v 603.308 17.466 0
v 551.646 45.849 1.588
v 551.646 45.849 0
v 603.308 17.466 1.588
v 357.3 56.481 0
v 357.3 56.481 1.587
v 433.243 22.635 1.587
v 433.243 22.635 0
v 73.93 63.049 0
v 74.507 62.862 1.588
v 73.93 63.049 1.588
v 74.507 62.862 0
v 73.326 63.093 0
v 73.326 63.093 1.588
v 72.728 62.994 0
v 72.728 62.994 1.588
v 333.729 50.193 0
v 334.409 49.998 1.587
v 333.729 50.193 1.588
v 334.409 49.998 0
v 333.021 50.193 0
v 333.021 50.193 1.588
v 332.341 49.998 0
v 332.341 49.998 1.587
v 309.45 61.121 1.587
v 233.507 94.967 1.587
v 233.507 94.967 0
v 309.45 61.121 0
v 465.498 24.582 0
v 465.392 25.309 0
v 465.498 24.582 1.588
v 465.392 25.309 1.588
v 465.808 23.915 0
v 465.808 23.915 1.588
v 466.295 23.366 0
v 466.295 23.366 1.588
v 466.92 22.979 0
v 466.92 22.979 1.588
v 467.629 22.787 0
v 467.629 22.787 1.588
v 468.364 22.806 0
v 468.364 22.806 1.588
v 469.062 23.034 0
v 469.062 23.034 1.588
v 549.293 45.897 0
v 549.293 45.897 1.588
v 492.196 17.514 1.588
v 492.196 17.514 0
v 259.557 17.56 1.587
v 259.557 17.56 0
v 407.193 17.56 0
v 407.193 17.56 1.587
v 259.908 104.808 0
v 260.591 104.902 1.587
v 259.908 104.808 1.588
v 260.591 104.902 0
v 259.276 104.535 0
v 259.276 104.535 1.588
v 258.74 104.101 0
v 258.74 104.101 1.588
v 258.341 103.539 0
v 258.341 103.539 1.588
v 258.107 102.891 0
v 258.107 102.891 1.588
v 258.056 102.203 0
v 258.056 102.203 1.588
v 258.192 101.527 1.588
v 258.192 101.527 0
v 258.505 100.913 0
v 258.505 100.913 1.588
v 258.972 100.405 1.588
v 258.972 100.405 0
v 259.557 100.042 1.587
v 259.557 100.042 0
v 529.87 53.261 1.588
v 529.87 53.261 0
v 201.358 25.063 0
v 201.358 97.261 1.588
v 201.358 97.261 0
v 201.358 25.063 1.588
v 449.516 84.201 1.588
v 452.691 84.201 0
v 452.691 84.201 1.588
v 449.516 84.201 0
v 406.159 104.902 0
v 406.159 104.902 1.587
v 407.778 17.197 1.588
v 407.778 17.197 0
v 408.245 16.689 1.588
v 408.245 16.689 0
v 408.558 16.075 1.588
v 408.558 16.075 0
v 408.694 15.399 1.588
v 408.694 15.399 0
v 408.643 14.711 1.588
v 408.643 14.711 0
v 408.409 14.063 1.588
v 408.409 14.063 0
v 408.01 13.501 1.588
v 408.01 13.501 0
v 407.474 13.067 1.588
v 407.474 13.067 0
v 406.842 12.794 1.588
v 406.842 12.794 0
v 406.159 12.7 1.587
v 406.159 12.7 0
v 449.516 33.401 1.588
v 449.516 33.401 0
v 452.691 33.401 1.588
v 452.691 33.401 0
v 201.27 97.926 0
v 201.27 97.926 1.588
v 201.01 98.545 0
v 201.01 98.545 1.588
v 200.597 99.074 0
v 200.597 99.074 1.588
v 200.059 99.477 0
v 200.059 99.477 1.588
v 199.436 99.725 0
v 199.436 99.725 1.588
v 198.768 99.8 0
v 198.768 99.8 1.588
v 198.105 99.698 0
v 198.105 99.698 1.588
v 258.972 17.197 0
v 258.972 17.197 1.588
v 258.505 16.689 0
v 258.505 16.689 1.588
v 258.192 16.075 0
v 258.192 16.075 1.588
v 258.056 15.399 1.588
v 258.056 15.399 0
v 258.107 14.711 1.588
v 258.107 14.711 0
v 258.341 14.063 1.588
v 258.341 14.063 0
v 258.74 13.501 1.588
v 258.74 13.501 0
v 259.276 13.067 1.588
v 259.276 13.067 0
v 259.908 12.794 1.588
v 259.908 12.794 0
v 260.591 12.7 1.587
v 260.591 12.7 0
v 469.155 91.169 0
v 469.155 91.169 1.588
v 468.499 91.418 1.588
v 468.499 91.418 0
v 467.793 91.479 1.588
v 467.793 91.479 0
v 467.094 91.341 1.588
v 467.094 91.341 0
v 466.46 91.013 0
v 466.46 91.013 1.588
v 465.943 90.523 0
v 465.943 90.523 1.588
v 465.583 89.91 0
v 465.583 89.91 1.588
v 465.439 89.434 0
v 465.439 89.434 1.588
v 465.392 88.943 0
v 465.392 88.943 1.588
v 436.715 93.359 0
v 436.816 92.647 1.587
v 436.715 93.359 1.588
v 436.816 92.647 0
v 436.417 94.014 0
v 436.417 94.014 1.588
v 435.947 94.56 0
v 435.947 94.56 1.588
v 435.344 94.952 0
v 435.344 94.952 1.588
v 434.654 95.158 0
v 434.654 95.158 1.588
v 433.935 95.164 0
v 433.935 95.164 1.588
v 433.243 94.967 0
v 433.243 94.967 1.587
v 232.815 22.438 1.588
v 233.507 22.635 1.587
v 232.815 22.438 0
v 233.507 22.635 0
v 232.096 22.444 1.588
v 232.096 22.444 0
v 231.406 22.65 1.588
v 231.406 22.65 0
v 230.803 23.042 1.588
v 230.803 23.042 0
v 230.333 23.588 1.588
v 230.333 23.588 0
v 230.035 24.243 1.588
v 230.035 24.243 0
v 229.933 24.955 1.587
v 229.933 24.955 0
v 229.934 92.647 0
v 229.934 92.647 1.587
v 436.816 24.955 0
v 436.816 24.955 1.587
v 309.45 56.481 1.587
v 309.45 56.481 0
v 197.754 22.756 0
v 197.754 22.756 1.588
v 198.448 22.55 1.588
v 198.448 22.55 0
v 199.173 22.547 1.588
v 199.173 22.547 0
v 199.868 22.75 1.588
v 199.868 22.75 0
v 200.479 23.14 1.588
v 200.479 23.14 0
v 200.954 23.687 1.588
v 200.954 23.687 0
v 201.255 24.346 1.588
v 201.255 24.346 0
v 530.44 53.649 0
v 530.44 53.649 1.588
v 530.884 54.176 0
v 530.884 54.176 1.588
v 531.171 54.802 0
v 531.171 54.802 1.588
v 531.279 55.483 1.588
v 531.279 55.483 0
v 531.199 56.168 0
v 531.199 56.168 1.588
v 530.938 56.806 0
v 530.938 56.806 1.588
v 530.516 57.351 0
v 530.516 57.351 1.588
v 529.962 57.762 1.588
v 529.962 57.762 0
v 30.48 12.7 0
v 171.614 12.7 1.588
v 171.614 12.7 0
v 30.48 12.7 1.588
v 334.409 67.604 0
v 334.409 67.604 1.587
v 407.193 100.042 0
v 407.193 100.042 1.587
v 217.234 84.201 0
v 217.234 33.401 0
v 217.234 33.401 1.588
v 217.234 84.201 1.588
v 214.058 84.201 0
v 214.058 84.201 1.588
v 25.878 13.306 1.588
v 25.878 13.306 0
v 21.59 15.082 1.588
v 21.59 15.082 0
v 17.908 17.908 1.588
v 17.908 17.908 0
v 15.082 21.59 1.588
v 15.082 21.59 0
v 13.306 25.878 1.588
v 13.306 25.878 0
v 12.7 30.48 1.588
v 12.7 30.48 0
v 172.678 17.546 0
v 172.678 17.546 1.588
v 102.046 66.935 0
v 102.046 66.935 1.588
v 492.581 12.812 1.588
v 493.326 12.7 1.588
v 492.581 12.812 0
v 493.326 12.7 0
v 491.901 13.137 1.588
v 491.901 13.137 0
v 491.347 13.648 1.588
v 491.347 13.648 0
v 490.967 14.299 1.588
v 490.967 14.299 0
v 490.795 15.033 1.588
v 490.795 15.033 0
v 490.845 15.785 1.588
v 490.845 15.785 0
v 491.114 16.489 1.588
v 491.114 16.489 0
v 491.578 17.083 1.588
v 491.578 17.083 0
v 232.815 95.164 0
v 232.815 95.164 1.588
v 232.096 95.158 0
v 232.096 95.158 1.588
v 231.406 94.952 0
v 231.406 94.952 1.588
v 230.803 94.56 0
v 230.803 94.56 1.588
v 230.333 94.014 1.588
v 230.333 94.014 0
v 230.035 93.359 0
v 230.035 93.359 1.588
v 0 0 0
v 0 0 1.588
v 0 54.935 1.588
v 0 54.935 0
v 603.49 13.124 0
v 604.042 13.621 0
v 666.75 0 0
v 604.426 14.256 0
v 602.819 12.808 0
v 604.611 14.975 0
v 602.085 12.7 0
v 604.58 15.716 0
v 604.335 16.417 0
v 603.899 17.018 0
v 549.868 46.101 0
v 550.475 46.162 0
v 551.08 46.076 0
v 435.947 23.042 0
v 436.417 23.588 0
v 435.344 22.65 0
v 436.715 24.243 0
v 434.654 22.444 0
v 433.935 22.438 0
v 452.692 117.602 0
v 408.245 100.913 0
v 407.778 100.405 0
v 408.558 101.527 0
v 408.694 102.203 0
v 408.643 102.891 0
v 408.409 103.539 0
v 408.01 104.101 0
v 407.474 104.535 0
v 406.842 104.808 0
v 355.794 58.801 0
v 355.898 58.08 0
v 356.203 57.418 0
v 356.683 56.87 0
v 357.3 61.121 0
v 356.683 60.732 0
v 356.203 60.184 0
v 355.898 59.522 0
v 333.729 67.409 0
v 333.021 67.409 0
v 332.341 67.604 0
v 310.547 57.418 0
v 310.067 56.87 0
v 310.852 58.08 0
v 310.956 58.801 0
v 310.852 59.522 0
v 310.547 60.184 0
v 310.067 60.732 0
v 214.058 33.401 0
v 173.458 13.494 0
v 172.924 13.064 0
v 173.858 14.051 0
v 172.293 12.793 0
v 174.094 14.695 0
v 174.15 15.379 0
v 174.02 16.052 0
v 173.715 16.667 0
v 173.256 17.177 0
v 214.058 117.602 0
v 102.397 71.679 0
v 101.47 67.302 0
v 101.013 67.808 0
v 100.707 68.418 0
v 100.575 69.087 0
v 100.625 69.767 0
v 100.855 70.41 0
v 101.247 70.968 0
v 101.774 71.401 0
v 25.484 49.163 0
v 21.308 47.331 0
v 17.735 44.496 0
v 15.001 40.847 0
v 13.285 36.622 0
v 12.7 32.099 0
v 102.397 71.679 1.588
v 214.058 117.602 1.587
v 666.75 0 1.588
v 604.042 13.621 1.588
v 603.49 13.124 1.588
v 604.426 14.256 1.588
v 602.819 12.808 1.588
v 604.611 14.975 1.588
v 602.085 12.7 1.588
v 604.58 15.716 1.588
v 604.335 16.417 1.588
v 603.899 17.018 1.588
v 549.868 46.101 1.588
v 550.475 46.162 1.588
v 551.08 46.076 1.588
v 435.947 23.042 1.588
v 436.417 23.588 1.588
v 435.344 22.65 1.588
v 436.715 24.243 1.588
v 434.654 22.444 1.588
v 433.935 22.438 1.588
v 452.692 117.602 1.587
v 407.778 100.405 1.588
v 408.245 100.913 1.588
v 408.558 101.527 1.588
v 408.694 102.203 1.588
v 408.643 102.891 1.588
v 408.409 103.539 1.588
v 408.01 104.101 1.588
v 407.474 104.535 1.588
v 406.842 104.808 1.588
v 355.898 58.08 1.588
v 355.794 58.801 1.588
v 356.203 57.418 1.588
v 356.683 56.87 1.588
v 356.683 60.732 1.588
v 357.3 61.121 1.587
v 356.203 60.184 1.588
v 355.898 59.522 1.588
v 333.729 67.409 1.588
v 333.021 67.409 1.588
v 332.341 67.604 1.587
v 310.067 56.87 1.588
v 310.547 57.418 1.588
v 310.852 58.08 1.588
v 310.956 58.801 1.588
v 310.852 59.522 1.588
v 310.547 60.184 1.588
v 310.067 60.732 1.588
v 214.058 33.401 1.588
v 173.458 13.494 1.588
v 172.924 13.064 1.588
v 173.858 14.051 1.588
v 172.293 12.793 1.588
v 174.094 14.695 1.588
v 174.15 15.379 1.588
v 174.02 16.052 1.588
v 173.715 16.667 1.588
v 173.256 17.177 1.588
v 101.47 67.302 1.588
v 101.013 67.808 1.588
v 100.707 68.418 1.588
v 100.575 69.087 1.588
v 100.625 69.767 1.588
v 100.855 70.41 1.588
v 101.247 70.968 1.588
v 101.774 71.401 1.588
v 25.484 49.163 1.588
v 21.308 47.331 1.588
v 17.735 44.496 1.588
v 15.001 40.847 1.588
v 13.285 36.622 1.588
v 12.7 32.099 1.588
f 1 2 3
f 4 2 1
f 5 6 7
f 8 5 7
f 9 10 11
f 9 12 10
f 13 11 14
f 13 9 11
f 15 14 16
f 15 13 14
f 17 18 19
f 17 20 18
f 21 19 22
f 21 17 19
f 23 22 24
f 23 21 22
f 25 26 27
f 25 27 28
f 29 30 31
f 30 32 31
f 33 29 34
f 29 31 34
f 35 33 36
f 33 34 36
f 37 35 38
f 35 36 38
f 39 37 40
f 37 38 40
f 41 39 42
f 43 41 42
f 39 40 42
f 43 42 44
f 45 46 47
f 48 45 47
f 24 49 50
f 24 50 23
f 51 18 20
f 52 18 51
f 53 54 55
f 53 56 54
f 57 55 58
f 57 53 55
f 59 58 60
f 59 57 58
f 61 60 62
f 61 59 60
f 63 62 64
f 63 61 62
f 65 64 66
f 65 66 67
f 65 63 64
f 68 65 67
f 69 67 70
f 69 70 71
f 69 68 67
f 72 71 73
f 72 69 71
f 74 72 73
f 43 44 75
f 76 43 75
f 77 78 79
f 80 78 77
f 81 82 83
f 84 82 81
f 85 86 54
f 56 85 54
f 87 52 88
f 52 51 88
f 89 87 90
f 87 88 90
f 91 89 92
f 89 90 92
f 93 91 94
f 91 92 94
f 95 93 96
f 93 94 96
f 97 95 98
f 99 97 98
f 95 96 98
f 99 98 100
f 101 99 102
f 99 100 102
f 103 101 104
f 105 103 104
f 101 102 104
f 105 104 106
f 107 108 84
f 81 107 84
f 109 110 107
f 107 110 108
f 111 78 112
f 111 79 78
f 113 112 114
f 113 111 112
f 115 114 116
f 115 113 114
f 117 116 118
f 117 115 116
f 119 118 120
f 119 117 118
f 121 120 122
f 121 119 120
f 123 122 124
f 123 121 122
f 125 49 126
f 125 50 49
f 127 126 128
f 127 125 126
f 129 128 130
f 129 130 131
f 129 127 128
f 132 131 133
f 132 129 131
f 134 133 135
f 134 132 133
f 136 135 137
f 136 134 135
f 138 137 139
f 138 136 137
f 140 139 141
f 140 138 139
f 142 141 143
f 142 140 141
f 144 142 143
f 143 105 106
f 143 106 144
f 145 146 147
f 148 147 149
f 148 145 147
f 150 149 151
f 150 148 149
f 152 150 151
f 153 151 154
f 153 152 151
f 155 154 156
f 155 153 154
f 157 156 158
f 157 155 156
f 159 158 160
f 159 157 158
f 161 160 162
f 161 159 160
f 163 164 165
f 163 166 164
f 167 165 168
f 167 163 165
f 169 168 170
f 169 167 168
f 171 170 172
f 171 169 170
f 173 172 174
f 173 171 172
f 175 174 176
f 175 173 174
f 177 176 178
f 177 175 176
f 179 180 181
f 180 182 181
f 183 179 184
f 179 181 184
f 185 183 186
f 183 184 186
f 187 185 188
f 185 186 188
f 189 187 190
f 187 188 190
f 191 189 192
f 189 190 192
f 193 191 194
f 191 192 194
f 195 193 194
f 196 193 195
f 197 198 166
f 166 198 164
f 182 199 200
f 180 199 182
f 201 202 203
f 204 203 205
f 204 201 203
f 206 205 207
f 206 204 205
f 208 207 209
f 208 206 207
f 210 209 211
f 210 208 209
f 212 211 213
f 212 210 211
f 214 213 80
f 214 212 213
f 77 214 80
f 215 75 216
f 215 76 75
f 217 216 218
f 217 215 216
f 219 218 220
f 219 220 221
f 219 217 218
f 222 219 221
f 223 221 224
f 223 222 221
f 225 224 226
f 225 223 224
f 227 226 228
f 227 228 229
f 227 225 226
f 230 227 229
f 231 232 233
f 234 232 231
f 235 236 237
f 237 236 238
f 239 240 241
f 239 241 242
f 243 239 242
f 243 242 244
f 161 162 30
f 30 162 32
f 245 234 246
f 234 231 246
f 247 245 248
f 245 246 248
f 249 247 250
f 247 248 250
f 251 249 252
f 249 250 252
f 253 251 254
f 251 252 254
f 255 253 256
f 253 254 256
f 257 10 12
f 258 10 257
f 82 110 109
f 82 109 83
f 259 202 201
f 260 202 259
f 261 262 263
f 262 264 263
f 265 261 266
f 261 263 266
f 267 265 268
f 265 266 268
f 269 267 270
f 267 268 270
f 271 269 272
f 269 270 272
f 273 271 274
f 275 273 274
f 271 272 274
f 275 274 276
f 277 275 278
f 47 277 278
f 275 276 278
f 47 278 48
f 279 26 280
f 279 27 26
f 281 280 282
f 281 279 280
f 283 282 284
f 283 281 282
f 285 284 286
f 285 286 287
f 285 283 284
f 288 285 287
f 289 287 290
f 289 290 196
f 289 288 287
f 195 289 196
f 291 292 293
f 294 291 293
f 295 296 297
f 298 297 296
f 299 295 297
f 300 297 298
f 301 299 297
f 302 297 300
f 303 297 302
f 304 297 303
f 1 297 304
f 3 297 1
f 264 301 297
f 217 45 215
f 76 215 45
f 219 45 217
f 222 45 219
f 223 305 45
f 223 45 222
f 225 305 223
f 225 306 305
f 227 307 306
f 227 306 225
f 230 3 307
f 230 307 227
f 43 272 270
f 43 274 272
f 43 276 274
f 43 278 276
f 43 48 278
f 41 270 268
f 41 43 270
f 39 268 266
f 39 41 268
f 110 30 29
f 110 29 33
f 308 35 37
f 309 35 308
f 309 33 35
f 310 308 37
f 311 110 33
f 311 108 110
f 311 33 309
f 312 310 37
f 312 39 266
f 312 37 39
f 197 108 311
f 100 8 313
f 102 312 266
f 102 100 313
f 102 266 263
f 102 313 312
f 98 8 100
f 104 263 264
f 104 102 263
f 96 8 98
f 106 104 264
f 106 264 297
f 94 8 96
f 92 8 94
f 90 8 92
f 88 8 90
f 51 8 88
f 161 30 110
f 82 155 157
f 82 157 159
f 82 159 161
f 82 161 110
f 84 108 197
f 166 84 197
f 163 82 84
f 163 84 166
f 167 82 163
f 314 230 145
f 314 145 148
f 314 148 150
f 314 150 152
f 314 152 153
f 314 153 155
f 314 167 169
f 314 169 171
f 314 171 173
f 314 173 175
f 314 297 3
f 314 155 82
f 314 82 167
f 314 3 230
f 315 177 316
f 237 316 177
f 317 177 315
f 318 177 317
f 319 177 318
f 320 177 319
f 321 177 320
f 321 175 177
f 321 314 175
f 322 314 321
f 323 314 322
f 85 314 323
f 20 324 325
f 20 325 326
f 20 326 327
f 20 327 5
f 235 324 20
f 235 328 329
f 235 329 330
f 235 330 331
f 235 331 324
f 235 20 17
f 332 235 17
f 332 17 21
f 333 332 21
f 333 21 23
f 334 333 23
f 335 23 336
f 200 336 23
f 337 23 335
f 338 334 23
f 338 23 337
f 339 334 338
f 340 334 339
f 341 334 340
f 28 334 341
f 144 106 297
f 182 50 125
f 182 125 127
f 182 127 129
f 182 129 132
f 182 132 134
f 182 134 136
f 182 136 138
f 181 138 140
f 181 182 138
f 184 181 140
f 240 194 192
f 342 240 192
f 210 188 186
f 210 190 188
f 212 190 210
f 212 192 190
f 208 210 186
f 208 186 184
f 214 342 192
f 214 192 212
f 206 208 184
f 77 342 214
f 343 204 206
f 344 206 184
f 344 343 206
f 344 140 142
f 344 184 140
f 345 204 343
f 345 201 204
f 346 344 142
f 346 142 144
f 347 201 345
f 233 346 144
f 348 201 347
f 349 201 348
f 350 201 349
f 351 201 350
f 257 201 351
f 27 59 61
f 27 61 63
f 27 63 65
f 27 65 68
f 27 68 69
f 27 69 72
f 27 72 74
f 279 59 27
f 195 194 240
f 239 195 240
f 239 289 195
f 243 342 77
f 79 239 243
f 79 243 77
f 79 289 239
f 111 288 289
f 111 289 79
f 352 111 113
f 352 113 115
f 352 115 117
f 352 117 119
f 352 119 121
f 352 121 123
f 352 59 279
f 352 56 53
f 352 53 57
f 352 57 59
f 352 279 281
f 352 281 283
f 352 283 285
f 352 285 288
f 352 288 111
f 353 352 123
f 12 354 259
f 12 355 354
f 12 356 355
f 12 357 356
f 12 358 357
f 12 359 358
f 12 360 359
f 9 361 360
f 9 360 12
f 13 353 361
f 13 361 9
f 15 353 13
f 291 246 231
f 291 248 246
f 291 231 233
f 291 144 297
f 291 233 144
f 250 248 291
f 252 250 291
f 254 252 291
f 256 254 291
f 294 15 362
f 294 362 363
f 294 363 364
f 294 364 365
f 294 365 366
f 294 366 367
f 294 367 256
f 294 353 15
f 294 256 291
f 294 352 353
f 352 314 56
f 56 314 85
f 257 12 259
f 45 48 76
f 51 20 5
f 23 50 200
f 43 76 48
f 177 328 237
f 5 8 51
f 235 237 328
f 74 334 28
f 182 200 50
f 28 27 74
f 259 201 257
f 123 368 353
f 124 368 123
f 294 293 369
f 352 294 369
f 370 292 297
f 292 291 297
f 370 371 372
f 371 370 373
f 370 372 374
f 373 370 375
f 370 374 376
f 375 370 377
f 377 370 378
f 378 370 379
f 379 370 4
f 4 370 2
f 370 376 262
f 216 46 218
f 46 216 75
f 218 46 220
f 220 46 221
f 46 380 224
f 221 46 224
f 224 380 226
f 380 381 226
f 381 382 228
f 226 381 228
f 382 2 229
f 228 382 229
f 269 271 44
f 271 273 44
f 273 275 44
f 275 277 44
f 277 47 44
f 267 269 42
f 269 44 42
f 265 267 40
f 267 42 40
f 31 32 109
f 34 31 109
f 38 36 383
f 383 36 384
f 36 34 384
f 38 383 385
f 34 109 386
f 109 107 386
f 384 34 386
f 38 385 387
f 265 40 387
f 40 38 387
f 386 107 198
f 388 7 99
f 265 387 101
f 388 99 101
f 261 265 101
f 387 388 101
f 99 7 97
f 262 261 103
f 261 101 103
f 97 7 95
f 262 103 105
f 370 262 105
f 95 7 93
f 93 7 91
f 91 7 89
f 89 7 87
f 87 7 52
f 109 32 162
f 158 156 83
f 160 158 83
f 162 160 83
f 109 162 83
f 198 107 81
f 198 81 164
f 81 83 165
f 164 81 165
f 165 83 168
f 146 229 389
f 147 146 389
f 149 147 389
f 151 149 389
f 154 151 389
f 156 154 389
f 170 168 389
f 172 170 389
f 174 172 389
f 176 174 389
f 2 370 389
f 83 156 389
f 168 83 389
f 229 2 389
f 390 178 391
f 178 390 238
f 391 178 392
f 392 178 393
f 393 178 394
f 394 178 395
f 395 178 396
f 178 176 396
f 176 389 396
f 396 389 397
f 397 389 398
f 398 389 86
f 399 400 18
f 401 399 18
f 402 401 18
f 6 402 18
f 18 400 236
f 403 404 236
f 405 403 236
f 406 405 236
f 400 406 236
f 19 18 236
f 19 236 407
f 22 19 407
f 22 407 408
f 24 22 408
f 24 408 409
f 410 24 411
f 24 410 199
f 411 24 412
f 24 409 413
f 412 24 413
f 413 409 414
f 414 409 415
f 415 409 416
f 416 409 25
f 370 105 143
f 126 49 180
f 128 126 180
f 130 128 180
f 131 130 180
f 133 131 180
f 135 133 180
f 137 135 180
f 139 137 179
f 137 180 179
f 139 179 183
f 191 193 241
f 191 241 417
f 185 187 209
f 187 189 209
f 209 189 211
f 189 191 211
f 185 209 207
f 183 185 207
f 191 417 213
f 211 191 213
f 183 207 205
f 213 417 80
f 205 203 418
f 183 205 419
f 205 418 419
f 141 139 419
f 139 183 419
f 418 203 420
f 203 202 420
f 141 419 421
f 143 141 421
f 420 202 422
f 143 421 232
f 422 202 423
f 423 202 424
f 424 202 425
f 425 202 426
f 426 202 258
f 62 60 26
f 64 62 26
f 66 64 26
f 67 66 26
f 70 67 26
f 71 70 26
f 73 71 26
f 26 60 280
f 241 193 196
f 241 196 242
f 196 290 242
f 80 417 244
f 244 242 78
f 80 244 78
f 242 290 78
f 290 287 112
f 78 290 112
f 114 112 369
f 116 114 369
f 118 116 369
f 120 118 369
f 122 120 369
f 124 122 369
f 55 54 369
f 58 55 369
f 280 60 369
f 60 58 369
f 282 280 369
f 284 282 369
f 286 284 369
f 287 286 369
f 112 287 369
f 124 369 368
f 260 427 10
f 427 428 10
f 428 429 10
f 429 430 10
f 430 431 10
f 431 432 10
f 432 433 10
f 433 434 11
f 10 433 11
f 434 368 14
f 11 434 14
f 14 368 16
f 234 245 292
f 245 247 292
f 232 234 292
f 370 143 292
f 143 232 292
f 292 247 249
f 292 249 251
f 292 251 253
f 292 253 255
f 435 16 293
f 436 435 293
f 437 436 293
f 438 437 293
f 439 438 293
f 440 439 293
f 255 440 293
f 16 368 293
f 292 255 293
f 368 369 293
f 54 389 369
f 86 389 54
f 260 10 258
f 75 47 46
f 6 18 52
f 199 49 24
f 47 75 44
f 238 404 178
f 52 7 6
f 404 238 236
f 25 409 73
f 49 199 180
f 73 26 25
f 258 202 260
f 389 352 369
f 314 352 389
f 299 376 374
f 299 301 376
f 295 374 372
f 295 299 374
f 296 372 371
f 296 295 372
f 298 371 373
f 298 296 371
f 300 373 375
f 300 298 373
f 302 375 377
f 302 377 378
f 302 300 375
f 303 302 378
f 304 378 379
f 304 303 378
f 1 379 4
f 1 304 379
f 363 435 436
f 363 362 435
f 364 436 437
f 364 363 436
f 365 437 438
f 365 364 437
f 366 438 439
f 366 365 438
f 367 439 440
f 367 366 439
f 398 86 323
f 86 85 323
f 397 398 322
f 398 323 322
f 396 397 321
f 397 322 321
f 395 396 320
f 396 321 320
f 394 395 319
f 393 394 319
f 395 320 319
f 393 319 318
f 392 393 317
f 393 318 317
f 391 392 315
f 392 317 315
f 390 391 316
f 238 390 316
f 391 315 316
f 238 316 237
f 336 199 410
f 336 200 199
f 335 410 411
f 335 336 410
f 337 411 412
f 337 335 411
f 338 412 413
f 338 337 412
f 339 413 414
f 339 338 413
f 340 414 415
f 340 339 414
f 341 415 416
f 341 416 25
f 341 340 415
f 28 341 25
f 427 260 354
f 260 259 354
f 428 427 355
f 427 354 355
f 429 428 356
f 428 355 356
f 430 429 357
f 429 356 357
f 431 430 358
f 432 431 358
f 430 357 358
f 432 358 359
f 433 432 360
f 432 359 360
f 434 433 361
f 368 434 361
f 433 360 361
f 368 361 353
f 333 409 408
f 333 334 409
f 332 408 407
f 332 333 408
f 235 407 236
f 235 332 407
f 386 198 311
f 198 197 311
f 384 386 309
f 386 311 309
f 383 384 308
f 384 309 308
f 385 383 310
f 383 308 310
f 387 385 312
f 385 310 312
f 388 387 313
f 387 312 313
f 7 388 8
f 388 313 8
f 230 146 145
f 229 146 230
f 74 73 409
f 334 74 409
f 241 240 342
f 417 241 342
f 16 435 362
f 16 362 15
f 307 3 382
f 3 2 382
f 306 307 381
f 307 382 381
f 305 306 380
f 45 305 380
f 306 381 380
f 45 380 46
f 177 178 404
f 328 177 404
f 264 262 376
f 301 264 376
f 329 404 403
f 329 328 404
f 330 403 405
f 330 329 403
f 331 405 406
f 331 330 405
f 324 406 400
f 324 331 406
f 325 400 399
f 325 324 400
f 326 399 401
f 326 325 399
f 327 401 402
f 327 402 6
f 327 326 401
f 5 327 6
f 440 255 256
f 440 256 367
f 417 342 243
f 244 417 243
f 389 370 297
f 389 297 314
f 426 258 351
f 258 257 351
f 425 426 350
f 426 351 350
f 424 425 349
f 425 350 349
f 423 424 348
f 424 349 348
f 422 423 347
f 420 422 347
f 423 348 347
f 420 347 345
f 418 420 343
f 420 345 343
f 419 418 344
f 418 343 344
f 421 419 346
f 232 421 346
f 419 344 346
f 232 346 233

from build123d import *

# Parameters (mm, degrees)
SKETCH1_W               = 666.75
SKETCH1_H               = 117.602
BOSS_EXTRUDE1_DEPTH     = 1.5875
CUT_EXTRUDE1_REACH      = 679.044
SKETCH3_W               = 3.175
SKETCH3_H               = 50.8
CUT_EXTRUDE2_DEPTH      = 678.043804388
FILLET1_R               = 2.54
FILLET1_OF_MIRROR1_R    = 2.54
CUT_EXTRUDE3_DEPTH      = 678.043804388
CUT_EXTRUDE3_DEPTH_BACK = 678.043804388
FILLET2_R               = 2.54
CUT_EXTRUDE4_REACH      = 679.044
BOSS_EXTRUDE7_DEPTH     = 1.5875
CUT_EXTRUDE5_REACH      = 679.044
FILLET3_R               = 2.54
BOSS_EXTRUDE9_DEPTH     = 1.5875
CUT_EXTRUDE10_REACH     = 679.044
FILLET4_R               = 2.54
FILLET5_R               = 17.78


with BuildPart() as part:
    # Sketch1 → Boss-Extrude1 (new body)
    with BuildSketch(Plane.XY):
        with Locations((333.375, 58.801)):
            Rectangle(SKETCH1_W, SKETCH1_H)
    extrude(amount=BOSS_EXTRUDE1_DEPTH)

    # Sketch3 → Cut-Extrude1 (cut, up to next)
    with BuildSketch(Plane(origin=(0, 0, 0), x_dir=(-1, 0, 0), z_dir=(0, 0, -1)), mode=Mode.PRIVATE) as cut_extrude1_sk1:
        with Locations((-215.646, 58.801)):
            Rectangle(SKETCH3_W, SKETCH3_H)
    cut_extrude1_tool1 = extrude(cut_extrude1_sk1.sketch, amount=-CUT_EXTRUDE1_REACH, mode=Mode.PRIVATE) & part.part
    # Sketch3 → Cut-Extrude1 (cut, up to next)
    with BuildSketch(Plane(origin=(0, 0, 0), x_dir=(-1, 0, 0), z_dir=(0, 0, -1)), mode=Mode.PRIVATE) as cut_extrude1_sk2:
        with Locations((-451.104, 58.801)):
            Rectangle(SKETCH3_W, SKETCH3_H)
    cut_extrude1_tool2 = extrude(cut_extrude1_sk2.sketch, amount=-CUT_EXTRUDE1_REACH, mode=Mode.PRIVATE) & part.part
    # Sketch3 → Cut-Extrude1 (cut, up to next)
    with BuildSketch(Plane(origin=(0, 0, 0), x_dir=(-1, 0, 0), z_dir=(0, 0, -1)), mode=Mode.PRIVATE) as cut_extrude1_sk3:
        with Locations((-665.1625, 58.801)):
            Rectangle(SKETCH3_W, SKETCH3_H)
    cut_extrude1_tool3 = extrude(cut_extrude1_sk3.sketch, amount=-CUT_EXTRUDE1_REACH, mode=Mode.PRIVATE) & part.part
    # Sketch3 → Cut-Extrude1 (cut, up to next)
    with BuildSketch(Plane(origin=(0, 0, 0), x_dir=(-1, 0, 0), z_dir=(0, 0, -1)), mode=Mode.PRIVATE) as cut_extrude1_sk4:
        with Locations((-1.5875, 58.801)):
            Rectangle(SKETCH3_W, SKETCH3_H)
    cut_extrude1_tool4 = extrude(cut_extrude1_sk4.sketch, amount=-CUT_EXTRUDE1_REACH, mode=Mode.PRIVATE) & part.part
    add(cut_extrude1_tool1.solids().sort_by_distance((215.646, 58.801, 0))[0], mode=Mode.SUBTRACT)
    add(cut_extrude1_tool2.solids().sort_by_distance((451.104, 58.801, 0))[0], mode=Mode.SUBTRACT)
    add(cut_extrude1_tool3.solids().sort_by_distance((665.1625, 58.801, 0))[0], mode=Mode.SUBTRACT)
    add(cut_extrude1_tool4.solids().sort_by_distance((1.5875, 58.801, 0))[0], mode=Mode.SUBTRACT)

    # Sketch4 → Cut-Extrude2 (cut, symmetric)
    with BuildSketch(Plane(origin=(0, 0, 0), x_dir=(-1, 0, 0), z_dir=(0, 0, -1))):
        Polygon((-482.510180694, 104.902), (-633.756319306, 104.902), (-558.13325, 67.310525631), align=None)
        Polygon((-465.3915, 96.392474369), (-465.3915, 21.209525631), (-541.014569306, 58.801), align=None)
        Polygon((-482.510180694, 12.7), (-633.756319306, 12.7), (-558.13325, 50.291474369), align=None)
        Polygon((-650.875, 96.392474369), (-650.875, 21.209525631), (-575.251930694, 58.801), align=None)
    cut_extrude2 = extrude(amount=CUT_EXTRUDE2_DEPTH, both=True, mode=Mode.SUBTRACT)

    # Fillet1
    fillet1_edges = [part.edges().sort_by_distance(p)[0] for p in [
        (650.875, 21.209525631, 0.79375),
        (650.875, 96.392474369, 0.79375),
        (633.756319306, 12.7, 0.79375),
        (558.13325, 50.291474369, 0.79375),
        (482.510180694, 12.7, 0.79375),
        (482.510180694, 104.902, 0.79375),
        (558.13325, 67.310525631, 0.79375),
        (633.756319306, 104.902, 0.79375),
        (541.014569306, 58.801, 0.79375),
        (465.3915, 96.392474369, 0.79375),
        (465.3915, 21.209525631, 0.79375),
        (575.251930694, 58.801, 0.79375),
    ]]
    fillet(fillet1_edges, radius=FILLET1_R)

    # Mirror1: Cut-Extrude2 across plane
    add(cut_extrude2.mirror(Plane(origin=(333.375, 0, 0), x_dir=(0, 0, 1), z_dir=(1, 0, 0))), mode=Mode.SUBTRACT)

    # Fillet1 of Mirror1
    fillet1_of_mirror1_edges = [part.edges().sort_by_distance(p)[0] for p in [
        (15.875, 21.209525631, 0.79375),
        (15.875, 96.392474369, 0.79375),
        (32.993680694, 12.7, 0.79375),
        (108.61675, 50.291474369, 0.79375),
        (184.239819306, 12.7, 0.79375),
        (184.239819306, 104.902, 0.79375),
        (108.61675, 67.310525631, 0.79375),
        (32.993680694, 104.902, 0.79375),
        (125.735430694, 58.801, 0.79375),
        (201.3585, 96.392474369, 0.79375),
        (201.3585, 21.209525631, 0.79375),
        (91.498069306, 58.801, 0.79375),
    ]]
    fillet(fillet1_of_mirror1_edges, radius=FILLET1_OF_MIRROR1_R)

    # Sketch6 → Cut-Extrude3 (cut, two sides: drawn at the far end of the back side and taken through both)
    with BuildSketch(Plane(origin=(0, 0, 0), x_dir=(-1, 0, 0), z_dir=(0, 0, -1)).offset(-CUT_EXTRUDE3_DEPTH_BACK)):
        Polygon((-418.097576662, 12.7), (-248.652423338, 12.7), (-333.375, 50.458496413), align=None)
        Polygon((-436.8165, 21.042503587), (-436.8165, 96.559496413), (-352.093923338, 58.801), align=None)
        Polygon((-418.097576662, 104.902), (-248.652423338, 104.902), (-333.375, 67.143503587), align=None)
        Polygon((-229.9335, 21.042503587), (-229.9335, 96.559496413), (-314.656076662, 58.801), align=None)
    extrude(amount=CUT_EXTRUDE3_DEPTH + CUT_EXTRUDE3_DEPTH_BACK, mode=Mode.SUBTRACT)

    # Fillet2
    fillet2_edges = [part.edges().sort_by_distance(p)[0] for p in [
        (314.656076662, 58.801, 0.79375),
        (229.9335, 96.559496413, 0.79375),
        (229.9335, 21.042503587, 0.79375),
        (418.097576662, 12.7, 0.79375),
        (333.375, 50.458496413, 0.79375),
        (248.652423338, 12.7, 0.79375),
        (352.093923338, 58.801, 0.79375),
        (436.8165, 21.042503587, 0.79375),
        (436.8165, 96.559496413, 0.79375),
        (248.652423338, 104.902, 0.79375),
        (333.375, 67.143503587, 0.79375),
        (418.097576662, 104.902, 0.79375),
    ]]
    fillet(fillet2_edges, radius=FILLET2_R)

    # Sketch7 → Cut-Extrude4 (cut, up to next)
    with BuildSketch(Plane.XY.offset(1.5875), mode=Mode.PRIVATE) as cut_extrude4_sk1:
        Polygon((666.75, 0), (452.6915, 117.602), (666.75, 117.602), align=None)
    cut_extrude4_tool1 = extrude(cut_extrude4_sk1.sketch, amount=-CUT_EXTRUDE4_REACH, mode=Mode.PRIVATE) & part.part
    # Sketch7 → Cut-Extrude4 (cut, up to next)
    with BuildSketch(Plane.XY.offset(1.5875), mode=Mode.PRIVATE) as cut_extrude4_sk2:
        Polygon((0, 117.602), (0, 0), (214.0585, 117.602), align=None)
    cut_extrude4_tool2 = extrude(cut_extrude4_sk2.sketch, amount=-CUT_EXTRUDE4_REACH, mode=Mode.PRIVATE) & part.part
    add(cut_extrude4_tool1.solids().sort_by_distance((595.397167, 78.401333, 1.5875))[0], mode=Mode.SUBTRACT)
    add(cut_extrude4_tool2.solids().sort_by_distance((71.352833, 78.401333, 1.5875))[0], mode=Mode.SUBTRACT)

    # Sketch8 → Boss-Extrude7 (add)
    with BuildSketch(Plane.XY.offset(1.5875)):
        Polygon((452.6915, 117.602), (445.353295325, 104.245041059), (635.099533668, 0), (642.437738342, 13.356958941), align=None)
        Polygon((31.650466332, 0), (24.312261658, 13.356958941), (214.0585, 117.602), (221.396704675, 104.245041059), align=None)
    extrude(amount=-BOSS_EXTRUDE7_DEPTH)

    # Sketch9 → Cut-Extrude5 (cut, up to next)
    with BuildSketch(Plane.XY.offset(1.5875), mode=Mode.PRIVATE) as cut_extrude5_sk1:
        Polygon((465.3915, 92.29335713), (465.3915, 93.236214284), (465.541652204, 93.153721884), align=None)
    cut_extrude5_tool1 = extrude(cut_extrude5_sk1.sketch, amount=-CUT_EXTRUDE5_REACH, mode=Mode.PRIVATE) & part.part
    # Sketch9 → Cut-Extrude5 (cut, up to next)
    with BuildSketch(Plane.XY.offset(1.5875), mode=Mode.PRIVATE) as cut_extrude5_sk2:
        Polygon((201.3585, 93.236214284), (201.208347796, 93.153721884), (201.3585, 92.29335713), align=None)
    cut_extrude5_tool2 = extrude(cut_extrude5_sk2.sketch, amount=-CUT_EXTRUDE5_REACH, mode=Mode.PRIVATE) & part.part
    add(cut_extrude5_tool1.solids().sort_by_distance((465.441551, 92.894431, 1.5875))[0], mode=Mode.SUBTRACT)
    add(cut_extrude5_tool2.solids().sort_by_distance((201.308449, 92.894431, 1.5875))[0], mode=Mode.SUBTRACT)

    # Fillet3
    fillet3_edges = [part.edges().sort_by_distance(p)[0] for p in [
        (534.218957024, 55.422968835, 0.79375),
        (550.482067841, 46.488147941, 0.79375),
        (611.983064985, 12.7, 0.79375),
        (54.766935015, 12.7, 0.79375),
        (116.267932159, 46.488147941, 0.79375),
        (132.531042976, 55.422968835, 0.79375),
        (465.3915, 93.236214284, 0.79375),
        (201.3585, 93.236214284, 0.79375),
    ]]
    fillet(fillet3_edges, radius=FILLET3_R)

    # Sketch13 → Boss-Extrude9 (add)
    with BuildSketch(Plane.XY.offset(1.5875)):
        Polygon((0, 54.934886574), (214.0585, 117.602), (214.0585, 0), (0, 0), align=None)
    extrude(amount=-BOSS_EXTRUDE9_DEPTH)

    # Sketch14 → Cut-Extrude10 (cut, up to next)
    with BuildSketch(Plane.XY.offset(1.5875), mode=Mode.PRIVATE) as cut_extrude10_sk1:
        Polygon((201.3585, 21.092638086), (95.893254571, 69.77525285), (201.3585, 100.650936356), align=None)
    cut_extrude10_tool1 = extrude(cut_extrude10_sk1.sketch, amount=-CUT_EXTRUDE10_REACH, mode=Mode.PRIVATE) & part.part
    # Sketch14 → Cut-Extrude10 (cut, up to next)
    with BuildSketch(Plane.XY.offset(1.5875), mode=Mode.PRIVATE) as cut_extrude10_sk2:
        Polygon((73.642109065, 63.261075374), (183.176821801, 12.7), (12.7, 12.7), (12.7, 45.419849442), align=None)
    cut_extrude10_tool2 = extrude(cut_extrude10_sk2.sketch, amount=-CUT_EXTRUDE10_REACH, mode=Mode.PRIVATE) & part.part
    add(cut_extrude10_tool1.solids().sort_by_distance((166.203418, 63.839609, 1.5875))[0], mode=Mode.SUBTRACT)
    add(cut_extrude10_tool2.solids().sort_by_distance((79.163512, 31.602776, 1.5875))[0], mode=Mode.SUBTRACT)

    # Fillet4
    fillet4_edges = [part.edges().sort_by_distance(p)[0] for p in [
        (201.3585, 100.650936356, 0.79375),
        (201.3585, 21.092638086, 0.79375),
        (95.893254571, 69.77525285, 0.79375),
        (73.642109065, 63.261075374, 0.79375),
        (183.176821801, 12.7, 0.79375),
    ]]
    fillet(fillet4_edges, radius=FILLET4_R)

    # Fillet5
    fillet5_edges = [part.edges().sort_by_distance(p)[0] for p in [
        (12.7, 45.419849442, 0.79375),
        (12.7, 12.7, 0.79375),
    ]]
    fillet(fillet5_edges, radius=FILLET5_R)


solid = part.part
